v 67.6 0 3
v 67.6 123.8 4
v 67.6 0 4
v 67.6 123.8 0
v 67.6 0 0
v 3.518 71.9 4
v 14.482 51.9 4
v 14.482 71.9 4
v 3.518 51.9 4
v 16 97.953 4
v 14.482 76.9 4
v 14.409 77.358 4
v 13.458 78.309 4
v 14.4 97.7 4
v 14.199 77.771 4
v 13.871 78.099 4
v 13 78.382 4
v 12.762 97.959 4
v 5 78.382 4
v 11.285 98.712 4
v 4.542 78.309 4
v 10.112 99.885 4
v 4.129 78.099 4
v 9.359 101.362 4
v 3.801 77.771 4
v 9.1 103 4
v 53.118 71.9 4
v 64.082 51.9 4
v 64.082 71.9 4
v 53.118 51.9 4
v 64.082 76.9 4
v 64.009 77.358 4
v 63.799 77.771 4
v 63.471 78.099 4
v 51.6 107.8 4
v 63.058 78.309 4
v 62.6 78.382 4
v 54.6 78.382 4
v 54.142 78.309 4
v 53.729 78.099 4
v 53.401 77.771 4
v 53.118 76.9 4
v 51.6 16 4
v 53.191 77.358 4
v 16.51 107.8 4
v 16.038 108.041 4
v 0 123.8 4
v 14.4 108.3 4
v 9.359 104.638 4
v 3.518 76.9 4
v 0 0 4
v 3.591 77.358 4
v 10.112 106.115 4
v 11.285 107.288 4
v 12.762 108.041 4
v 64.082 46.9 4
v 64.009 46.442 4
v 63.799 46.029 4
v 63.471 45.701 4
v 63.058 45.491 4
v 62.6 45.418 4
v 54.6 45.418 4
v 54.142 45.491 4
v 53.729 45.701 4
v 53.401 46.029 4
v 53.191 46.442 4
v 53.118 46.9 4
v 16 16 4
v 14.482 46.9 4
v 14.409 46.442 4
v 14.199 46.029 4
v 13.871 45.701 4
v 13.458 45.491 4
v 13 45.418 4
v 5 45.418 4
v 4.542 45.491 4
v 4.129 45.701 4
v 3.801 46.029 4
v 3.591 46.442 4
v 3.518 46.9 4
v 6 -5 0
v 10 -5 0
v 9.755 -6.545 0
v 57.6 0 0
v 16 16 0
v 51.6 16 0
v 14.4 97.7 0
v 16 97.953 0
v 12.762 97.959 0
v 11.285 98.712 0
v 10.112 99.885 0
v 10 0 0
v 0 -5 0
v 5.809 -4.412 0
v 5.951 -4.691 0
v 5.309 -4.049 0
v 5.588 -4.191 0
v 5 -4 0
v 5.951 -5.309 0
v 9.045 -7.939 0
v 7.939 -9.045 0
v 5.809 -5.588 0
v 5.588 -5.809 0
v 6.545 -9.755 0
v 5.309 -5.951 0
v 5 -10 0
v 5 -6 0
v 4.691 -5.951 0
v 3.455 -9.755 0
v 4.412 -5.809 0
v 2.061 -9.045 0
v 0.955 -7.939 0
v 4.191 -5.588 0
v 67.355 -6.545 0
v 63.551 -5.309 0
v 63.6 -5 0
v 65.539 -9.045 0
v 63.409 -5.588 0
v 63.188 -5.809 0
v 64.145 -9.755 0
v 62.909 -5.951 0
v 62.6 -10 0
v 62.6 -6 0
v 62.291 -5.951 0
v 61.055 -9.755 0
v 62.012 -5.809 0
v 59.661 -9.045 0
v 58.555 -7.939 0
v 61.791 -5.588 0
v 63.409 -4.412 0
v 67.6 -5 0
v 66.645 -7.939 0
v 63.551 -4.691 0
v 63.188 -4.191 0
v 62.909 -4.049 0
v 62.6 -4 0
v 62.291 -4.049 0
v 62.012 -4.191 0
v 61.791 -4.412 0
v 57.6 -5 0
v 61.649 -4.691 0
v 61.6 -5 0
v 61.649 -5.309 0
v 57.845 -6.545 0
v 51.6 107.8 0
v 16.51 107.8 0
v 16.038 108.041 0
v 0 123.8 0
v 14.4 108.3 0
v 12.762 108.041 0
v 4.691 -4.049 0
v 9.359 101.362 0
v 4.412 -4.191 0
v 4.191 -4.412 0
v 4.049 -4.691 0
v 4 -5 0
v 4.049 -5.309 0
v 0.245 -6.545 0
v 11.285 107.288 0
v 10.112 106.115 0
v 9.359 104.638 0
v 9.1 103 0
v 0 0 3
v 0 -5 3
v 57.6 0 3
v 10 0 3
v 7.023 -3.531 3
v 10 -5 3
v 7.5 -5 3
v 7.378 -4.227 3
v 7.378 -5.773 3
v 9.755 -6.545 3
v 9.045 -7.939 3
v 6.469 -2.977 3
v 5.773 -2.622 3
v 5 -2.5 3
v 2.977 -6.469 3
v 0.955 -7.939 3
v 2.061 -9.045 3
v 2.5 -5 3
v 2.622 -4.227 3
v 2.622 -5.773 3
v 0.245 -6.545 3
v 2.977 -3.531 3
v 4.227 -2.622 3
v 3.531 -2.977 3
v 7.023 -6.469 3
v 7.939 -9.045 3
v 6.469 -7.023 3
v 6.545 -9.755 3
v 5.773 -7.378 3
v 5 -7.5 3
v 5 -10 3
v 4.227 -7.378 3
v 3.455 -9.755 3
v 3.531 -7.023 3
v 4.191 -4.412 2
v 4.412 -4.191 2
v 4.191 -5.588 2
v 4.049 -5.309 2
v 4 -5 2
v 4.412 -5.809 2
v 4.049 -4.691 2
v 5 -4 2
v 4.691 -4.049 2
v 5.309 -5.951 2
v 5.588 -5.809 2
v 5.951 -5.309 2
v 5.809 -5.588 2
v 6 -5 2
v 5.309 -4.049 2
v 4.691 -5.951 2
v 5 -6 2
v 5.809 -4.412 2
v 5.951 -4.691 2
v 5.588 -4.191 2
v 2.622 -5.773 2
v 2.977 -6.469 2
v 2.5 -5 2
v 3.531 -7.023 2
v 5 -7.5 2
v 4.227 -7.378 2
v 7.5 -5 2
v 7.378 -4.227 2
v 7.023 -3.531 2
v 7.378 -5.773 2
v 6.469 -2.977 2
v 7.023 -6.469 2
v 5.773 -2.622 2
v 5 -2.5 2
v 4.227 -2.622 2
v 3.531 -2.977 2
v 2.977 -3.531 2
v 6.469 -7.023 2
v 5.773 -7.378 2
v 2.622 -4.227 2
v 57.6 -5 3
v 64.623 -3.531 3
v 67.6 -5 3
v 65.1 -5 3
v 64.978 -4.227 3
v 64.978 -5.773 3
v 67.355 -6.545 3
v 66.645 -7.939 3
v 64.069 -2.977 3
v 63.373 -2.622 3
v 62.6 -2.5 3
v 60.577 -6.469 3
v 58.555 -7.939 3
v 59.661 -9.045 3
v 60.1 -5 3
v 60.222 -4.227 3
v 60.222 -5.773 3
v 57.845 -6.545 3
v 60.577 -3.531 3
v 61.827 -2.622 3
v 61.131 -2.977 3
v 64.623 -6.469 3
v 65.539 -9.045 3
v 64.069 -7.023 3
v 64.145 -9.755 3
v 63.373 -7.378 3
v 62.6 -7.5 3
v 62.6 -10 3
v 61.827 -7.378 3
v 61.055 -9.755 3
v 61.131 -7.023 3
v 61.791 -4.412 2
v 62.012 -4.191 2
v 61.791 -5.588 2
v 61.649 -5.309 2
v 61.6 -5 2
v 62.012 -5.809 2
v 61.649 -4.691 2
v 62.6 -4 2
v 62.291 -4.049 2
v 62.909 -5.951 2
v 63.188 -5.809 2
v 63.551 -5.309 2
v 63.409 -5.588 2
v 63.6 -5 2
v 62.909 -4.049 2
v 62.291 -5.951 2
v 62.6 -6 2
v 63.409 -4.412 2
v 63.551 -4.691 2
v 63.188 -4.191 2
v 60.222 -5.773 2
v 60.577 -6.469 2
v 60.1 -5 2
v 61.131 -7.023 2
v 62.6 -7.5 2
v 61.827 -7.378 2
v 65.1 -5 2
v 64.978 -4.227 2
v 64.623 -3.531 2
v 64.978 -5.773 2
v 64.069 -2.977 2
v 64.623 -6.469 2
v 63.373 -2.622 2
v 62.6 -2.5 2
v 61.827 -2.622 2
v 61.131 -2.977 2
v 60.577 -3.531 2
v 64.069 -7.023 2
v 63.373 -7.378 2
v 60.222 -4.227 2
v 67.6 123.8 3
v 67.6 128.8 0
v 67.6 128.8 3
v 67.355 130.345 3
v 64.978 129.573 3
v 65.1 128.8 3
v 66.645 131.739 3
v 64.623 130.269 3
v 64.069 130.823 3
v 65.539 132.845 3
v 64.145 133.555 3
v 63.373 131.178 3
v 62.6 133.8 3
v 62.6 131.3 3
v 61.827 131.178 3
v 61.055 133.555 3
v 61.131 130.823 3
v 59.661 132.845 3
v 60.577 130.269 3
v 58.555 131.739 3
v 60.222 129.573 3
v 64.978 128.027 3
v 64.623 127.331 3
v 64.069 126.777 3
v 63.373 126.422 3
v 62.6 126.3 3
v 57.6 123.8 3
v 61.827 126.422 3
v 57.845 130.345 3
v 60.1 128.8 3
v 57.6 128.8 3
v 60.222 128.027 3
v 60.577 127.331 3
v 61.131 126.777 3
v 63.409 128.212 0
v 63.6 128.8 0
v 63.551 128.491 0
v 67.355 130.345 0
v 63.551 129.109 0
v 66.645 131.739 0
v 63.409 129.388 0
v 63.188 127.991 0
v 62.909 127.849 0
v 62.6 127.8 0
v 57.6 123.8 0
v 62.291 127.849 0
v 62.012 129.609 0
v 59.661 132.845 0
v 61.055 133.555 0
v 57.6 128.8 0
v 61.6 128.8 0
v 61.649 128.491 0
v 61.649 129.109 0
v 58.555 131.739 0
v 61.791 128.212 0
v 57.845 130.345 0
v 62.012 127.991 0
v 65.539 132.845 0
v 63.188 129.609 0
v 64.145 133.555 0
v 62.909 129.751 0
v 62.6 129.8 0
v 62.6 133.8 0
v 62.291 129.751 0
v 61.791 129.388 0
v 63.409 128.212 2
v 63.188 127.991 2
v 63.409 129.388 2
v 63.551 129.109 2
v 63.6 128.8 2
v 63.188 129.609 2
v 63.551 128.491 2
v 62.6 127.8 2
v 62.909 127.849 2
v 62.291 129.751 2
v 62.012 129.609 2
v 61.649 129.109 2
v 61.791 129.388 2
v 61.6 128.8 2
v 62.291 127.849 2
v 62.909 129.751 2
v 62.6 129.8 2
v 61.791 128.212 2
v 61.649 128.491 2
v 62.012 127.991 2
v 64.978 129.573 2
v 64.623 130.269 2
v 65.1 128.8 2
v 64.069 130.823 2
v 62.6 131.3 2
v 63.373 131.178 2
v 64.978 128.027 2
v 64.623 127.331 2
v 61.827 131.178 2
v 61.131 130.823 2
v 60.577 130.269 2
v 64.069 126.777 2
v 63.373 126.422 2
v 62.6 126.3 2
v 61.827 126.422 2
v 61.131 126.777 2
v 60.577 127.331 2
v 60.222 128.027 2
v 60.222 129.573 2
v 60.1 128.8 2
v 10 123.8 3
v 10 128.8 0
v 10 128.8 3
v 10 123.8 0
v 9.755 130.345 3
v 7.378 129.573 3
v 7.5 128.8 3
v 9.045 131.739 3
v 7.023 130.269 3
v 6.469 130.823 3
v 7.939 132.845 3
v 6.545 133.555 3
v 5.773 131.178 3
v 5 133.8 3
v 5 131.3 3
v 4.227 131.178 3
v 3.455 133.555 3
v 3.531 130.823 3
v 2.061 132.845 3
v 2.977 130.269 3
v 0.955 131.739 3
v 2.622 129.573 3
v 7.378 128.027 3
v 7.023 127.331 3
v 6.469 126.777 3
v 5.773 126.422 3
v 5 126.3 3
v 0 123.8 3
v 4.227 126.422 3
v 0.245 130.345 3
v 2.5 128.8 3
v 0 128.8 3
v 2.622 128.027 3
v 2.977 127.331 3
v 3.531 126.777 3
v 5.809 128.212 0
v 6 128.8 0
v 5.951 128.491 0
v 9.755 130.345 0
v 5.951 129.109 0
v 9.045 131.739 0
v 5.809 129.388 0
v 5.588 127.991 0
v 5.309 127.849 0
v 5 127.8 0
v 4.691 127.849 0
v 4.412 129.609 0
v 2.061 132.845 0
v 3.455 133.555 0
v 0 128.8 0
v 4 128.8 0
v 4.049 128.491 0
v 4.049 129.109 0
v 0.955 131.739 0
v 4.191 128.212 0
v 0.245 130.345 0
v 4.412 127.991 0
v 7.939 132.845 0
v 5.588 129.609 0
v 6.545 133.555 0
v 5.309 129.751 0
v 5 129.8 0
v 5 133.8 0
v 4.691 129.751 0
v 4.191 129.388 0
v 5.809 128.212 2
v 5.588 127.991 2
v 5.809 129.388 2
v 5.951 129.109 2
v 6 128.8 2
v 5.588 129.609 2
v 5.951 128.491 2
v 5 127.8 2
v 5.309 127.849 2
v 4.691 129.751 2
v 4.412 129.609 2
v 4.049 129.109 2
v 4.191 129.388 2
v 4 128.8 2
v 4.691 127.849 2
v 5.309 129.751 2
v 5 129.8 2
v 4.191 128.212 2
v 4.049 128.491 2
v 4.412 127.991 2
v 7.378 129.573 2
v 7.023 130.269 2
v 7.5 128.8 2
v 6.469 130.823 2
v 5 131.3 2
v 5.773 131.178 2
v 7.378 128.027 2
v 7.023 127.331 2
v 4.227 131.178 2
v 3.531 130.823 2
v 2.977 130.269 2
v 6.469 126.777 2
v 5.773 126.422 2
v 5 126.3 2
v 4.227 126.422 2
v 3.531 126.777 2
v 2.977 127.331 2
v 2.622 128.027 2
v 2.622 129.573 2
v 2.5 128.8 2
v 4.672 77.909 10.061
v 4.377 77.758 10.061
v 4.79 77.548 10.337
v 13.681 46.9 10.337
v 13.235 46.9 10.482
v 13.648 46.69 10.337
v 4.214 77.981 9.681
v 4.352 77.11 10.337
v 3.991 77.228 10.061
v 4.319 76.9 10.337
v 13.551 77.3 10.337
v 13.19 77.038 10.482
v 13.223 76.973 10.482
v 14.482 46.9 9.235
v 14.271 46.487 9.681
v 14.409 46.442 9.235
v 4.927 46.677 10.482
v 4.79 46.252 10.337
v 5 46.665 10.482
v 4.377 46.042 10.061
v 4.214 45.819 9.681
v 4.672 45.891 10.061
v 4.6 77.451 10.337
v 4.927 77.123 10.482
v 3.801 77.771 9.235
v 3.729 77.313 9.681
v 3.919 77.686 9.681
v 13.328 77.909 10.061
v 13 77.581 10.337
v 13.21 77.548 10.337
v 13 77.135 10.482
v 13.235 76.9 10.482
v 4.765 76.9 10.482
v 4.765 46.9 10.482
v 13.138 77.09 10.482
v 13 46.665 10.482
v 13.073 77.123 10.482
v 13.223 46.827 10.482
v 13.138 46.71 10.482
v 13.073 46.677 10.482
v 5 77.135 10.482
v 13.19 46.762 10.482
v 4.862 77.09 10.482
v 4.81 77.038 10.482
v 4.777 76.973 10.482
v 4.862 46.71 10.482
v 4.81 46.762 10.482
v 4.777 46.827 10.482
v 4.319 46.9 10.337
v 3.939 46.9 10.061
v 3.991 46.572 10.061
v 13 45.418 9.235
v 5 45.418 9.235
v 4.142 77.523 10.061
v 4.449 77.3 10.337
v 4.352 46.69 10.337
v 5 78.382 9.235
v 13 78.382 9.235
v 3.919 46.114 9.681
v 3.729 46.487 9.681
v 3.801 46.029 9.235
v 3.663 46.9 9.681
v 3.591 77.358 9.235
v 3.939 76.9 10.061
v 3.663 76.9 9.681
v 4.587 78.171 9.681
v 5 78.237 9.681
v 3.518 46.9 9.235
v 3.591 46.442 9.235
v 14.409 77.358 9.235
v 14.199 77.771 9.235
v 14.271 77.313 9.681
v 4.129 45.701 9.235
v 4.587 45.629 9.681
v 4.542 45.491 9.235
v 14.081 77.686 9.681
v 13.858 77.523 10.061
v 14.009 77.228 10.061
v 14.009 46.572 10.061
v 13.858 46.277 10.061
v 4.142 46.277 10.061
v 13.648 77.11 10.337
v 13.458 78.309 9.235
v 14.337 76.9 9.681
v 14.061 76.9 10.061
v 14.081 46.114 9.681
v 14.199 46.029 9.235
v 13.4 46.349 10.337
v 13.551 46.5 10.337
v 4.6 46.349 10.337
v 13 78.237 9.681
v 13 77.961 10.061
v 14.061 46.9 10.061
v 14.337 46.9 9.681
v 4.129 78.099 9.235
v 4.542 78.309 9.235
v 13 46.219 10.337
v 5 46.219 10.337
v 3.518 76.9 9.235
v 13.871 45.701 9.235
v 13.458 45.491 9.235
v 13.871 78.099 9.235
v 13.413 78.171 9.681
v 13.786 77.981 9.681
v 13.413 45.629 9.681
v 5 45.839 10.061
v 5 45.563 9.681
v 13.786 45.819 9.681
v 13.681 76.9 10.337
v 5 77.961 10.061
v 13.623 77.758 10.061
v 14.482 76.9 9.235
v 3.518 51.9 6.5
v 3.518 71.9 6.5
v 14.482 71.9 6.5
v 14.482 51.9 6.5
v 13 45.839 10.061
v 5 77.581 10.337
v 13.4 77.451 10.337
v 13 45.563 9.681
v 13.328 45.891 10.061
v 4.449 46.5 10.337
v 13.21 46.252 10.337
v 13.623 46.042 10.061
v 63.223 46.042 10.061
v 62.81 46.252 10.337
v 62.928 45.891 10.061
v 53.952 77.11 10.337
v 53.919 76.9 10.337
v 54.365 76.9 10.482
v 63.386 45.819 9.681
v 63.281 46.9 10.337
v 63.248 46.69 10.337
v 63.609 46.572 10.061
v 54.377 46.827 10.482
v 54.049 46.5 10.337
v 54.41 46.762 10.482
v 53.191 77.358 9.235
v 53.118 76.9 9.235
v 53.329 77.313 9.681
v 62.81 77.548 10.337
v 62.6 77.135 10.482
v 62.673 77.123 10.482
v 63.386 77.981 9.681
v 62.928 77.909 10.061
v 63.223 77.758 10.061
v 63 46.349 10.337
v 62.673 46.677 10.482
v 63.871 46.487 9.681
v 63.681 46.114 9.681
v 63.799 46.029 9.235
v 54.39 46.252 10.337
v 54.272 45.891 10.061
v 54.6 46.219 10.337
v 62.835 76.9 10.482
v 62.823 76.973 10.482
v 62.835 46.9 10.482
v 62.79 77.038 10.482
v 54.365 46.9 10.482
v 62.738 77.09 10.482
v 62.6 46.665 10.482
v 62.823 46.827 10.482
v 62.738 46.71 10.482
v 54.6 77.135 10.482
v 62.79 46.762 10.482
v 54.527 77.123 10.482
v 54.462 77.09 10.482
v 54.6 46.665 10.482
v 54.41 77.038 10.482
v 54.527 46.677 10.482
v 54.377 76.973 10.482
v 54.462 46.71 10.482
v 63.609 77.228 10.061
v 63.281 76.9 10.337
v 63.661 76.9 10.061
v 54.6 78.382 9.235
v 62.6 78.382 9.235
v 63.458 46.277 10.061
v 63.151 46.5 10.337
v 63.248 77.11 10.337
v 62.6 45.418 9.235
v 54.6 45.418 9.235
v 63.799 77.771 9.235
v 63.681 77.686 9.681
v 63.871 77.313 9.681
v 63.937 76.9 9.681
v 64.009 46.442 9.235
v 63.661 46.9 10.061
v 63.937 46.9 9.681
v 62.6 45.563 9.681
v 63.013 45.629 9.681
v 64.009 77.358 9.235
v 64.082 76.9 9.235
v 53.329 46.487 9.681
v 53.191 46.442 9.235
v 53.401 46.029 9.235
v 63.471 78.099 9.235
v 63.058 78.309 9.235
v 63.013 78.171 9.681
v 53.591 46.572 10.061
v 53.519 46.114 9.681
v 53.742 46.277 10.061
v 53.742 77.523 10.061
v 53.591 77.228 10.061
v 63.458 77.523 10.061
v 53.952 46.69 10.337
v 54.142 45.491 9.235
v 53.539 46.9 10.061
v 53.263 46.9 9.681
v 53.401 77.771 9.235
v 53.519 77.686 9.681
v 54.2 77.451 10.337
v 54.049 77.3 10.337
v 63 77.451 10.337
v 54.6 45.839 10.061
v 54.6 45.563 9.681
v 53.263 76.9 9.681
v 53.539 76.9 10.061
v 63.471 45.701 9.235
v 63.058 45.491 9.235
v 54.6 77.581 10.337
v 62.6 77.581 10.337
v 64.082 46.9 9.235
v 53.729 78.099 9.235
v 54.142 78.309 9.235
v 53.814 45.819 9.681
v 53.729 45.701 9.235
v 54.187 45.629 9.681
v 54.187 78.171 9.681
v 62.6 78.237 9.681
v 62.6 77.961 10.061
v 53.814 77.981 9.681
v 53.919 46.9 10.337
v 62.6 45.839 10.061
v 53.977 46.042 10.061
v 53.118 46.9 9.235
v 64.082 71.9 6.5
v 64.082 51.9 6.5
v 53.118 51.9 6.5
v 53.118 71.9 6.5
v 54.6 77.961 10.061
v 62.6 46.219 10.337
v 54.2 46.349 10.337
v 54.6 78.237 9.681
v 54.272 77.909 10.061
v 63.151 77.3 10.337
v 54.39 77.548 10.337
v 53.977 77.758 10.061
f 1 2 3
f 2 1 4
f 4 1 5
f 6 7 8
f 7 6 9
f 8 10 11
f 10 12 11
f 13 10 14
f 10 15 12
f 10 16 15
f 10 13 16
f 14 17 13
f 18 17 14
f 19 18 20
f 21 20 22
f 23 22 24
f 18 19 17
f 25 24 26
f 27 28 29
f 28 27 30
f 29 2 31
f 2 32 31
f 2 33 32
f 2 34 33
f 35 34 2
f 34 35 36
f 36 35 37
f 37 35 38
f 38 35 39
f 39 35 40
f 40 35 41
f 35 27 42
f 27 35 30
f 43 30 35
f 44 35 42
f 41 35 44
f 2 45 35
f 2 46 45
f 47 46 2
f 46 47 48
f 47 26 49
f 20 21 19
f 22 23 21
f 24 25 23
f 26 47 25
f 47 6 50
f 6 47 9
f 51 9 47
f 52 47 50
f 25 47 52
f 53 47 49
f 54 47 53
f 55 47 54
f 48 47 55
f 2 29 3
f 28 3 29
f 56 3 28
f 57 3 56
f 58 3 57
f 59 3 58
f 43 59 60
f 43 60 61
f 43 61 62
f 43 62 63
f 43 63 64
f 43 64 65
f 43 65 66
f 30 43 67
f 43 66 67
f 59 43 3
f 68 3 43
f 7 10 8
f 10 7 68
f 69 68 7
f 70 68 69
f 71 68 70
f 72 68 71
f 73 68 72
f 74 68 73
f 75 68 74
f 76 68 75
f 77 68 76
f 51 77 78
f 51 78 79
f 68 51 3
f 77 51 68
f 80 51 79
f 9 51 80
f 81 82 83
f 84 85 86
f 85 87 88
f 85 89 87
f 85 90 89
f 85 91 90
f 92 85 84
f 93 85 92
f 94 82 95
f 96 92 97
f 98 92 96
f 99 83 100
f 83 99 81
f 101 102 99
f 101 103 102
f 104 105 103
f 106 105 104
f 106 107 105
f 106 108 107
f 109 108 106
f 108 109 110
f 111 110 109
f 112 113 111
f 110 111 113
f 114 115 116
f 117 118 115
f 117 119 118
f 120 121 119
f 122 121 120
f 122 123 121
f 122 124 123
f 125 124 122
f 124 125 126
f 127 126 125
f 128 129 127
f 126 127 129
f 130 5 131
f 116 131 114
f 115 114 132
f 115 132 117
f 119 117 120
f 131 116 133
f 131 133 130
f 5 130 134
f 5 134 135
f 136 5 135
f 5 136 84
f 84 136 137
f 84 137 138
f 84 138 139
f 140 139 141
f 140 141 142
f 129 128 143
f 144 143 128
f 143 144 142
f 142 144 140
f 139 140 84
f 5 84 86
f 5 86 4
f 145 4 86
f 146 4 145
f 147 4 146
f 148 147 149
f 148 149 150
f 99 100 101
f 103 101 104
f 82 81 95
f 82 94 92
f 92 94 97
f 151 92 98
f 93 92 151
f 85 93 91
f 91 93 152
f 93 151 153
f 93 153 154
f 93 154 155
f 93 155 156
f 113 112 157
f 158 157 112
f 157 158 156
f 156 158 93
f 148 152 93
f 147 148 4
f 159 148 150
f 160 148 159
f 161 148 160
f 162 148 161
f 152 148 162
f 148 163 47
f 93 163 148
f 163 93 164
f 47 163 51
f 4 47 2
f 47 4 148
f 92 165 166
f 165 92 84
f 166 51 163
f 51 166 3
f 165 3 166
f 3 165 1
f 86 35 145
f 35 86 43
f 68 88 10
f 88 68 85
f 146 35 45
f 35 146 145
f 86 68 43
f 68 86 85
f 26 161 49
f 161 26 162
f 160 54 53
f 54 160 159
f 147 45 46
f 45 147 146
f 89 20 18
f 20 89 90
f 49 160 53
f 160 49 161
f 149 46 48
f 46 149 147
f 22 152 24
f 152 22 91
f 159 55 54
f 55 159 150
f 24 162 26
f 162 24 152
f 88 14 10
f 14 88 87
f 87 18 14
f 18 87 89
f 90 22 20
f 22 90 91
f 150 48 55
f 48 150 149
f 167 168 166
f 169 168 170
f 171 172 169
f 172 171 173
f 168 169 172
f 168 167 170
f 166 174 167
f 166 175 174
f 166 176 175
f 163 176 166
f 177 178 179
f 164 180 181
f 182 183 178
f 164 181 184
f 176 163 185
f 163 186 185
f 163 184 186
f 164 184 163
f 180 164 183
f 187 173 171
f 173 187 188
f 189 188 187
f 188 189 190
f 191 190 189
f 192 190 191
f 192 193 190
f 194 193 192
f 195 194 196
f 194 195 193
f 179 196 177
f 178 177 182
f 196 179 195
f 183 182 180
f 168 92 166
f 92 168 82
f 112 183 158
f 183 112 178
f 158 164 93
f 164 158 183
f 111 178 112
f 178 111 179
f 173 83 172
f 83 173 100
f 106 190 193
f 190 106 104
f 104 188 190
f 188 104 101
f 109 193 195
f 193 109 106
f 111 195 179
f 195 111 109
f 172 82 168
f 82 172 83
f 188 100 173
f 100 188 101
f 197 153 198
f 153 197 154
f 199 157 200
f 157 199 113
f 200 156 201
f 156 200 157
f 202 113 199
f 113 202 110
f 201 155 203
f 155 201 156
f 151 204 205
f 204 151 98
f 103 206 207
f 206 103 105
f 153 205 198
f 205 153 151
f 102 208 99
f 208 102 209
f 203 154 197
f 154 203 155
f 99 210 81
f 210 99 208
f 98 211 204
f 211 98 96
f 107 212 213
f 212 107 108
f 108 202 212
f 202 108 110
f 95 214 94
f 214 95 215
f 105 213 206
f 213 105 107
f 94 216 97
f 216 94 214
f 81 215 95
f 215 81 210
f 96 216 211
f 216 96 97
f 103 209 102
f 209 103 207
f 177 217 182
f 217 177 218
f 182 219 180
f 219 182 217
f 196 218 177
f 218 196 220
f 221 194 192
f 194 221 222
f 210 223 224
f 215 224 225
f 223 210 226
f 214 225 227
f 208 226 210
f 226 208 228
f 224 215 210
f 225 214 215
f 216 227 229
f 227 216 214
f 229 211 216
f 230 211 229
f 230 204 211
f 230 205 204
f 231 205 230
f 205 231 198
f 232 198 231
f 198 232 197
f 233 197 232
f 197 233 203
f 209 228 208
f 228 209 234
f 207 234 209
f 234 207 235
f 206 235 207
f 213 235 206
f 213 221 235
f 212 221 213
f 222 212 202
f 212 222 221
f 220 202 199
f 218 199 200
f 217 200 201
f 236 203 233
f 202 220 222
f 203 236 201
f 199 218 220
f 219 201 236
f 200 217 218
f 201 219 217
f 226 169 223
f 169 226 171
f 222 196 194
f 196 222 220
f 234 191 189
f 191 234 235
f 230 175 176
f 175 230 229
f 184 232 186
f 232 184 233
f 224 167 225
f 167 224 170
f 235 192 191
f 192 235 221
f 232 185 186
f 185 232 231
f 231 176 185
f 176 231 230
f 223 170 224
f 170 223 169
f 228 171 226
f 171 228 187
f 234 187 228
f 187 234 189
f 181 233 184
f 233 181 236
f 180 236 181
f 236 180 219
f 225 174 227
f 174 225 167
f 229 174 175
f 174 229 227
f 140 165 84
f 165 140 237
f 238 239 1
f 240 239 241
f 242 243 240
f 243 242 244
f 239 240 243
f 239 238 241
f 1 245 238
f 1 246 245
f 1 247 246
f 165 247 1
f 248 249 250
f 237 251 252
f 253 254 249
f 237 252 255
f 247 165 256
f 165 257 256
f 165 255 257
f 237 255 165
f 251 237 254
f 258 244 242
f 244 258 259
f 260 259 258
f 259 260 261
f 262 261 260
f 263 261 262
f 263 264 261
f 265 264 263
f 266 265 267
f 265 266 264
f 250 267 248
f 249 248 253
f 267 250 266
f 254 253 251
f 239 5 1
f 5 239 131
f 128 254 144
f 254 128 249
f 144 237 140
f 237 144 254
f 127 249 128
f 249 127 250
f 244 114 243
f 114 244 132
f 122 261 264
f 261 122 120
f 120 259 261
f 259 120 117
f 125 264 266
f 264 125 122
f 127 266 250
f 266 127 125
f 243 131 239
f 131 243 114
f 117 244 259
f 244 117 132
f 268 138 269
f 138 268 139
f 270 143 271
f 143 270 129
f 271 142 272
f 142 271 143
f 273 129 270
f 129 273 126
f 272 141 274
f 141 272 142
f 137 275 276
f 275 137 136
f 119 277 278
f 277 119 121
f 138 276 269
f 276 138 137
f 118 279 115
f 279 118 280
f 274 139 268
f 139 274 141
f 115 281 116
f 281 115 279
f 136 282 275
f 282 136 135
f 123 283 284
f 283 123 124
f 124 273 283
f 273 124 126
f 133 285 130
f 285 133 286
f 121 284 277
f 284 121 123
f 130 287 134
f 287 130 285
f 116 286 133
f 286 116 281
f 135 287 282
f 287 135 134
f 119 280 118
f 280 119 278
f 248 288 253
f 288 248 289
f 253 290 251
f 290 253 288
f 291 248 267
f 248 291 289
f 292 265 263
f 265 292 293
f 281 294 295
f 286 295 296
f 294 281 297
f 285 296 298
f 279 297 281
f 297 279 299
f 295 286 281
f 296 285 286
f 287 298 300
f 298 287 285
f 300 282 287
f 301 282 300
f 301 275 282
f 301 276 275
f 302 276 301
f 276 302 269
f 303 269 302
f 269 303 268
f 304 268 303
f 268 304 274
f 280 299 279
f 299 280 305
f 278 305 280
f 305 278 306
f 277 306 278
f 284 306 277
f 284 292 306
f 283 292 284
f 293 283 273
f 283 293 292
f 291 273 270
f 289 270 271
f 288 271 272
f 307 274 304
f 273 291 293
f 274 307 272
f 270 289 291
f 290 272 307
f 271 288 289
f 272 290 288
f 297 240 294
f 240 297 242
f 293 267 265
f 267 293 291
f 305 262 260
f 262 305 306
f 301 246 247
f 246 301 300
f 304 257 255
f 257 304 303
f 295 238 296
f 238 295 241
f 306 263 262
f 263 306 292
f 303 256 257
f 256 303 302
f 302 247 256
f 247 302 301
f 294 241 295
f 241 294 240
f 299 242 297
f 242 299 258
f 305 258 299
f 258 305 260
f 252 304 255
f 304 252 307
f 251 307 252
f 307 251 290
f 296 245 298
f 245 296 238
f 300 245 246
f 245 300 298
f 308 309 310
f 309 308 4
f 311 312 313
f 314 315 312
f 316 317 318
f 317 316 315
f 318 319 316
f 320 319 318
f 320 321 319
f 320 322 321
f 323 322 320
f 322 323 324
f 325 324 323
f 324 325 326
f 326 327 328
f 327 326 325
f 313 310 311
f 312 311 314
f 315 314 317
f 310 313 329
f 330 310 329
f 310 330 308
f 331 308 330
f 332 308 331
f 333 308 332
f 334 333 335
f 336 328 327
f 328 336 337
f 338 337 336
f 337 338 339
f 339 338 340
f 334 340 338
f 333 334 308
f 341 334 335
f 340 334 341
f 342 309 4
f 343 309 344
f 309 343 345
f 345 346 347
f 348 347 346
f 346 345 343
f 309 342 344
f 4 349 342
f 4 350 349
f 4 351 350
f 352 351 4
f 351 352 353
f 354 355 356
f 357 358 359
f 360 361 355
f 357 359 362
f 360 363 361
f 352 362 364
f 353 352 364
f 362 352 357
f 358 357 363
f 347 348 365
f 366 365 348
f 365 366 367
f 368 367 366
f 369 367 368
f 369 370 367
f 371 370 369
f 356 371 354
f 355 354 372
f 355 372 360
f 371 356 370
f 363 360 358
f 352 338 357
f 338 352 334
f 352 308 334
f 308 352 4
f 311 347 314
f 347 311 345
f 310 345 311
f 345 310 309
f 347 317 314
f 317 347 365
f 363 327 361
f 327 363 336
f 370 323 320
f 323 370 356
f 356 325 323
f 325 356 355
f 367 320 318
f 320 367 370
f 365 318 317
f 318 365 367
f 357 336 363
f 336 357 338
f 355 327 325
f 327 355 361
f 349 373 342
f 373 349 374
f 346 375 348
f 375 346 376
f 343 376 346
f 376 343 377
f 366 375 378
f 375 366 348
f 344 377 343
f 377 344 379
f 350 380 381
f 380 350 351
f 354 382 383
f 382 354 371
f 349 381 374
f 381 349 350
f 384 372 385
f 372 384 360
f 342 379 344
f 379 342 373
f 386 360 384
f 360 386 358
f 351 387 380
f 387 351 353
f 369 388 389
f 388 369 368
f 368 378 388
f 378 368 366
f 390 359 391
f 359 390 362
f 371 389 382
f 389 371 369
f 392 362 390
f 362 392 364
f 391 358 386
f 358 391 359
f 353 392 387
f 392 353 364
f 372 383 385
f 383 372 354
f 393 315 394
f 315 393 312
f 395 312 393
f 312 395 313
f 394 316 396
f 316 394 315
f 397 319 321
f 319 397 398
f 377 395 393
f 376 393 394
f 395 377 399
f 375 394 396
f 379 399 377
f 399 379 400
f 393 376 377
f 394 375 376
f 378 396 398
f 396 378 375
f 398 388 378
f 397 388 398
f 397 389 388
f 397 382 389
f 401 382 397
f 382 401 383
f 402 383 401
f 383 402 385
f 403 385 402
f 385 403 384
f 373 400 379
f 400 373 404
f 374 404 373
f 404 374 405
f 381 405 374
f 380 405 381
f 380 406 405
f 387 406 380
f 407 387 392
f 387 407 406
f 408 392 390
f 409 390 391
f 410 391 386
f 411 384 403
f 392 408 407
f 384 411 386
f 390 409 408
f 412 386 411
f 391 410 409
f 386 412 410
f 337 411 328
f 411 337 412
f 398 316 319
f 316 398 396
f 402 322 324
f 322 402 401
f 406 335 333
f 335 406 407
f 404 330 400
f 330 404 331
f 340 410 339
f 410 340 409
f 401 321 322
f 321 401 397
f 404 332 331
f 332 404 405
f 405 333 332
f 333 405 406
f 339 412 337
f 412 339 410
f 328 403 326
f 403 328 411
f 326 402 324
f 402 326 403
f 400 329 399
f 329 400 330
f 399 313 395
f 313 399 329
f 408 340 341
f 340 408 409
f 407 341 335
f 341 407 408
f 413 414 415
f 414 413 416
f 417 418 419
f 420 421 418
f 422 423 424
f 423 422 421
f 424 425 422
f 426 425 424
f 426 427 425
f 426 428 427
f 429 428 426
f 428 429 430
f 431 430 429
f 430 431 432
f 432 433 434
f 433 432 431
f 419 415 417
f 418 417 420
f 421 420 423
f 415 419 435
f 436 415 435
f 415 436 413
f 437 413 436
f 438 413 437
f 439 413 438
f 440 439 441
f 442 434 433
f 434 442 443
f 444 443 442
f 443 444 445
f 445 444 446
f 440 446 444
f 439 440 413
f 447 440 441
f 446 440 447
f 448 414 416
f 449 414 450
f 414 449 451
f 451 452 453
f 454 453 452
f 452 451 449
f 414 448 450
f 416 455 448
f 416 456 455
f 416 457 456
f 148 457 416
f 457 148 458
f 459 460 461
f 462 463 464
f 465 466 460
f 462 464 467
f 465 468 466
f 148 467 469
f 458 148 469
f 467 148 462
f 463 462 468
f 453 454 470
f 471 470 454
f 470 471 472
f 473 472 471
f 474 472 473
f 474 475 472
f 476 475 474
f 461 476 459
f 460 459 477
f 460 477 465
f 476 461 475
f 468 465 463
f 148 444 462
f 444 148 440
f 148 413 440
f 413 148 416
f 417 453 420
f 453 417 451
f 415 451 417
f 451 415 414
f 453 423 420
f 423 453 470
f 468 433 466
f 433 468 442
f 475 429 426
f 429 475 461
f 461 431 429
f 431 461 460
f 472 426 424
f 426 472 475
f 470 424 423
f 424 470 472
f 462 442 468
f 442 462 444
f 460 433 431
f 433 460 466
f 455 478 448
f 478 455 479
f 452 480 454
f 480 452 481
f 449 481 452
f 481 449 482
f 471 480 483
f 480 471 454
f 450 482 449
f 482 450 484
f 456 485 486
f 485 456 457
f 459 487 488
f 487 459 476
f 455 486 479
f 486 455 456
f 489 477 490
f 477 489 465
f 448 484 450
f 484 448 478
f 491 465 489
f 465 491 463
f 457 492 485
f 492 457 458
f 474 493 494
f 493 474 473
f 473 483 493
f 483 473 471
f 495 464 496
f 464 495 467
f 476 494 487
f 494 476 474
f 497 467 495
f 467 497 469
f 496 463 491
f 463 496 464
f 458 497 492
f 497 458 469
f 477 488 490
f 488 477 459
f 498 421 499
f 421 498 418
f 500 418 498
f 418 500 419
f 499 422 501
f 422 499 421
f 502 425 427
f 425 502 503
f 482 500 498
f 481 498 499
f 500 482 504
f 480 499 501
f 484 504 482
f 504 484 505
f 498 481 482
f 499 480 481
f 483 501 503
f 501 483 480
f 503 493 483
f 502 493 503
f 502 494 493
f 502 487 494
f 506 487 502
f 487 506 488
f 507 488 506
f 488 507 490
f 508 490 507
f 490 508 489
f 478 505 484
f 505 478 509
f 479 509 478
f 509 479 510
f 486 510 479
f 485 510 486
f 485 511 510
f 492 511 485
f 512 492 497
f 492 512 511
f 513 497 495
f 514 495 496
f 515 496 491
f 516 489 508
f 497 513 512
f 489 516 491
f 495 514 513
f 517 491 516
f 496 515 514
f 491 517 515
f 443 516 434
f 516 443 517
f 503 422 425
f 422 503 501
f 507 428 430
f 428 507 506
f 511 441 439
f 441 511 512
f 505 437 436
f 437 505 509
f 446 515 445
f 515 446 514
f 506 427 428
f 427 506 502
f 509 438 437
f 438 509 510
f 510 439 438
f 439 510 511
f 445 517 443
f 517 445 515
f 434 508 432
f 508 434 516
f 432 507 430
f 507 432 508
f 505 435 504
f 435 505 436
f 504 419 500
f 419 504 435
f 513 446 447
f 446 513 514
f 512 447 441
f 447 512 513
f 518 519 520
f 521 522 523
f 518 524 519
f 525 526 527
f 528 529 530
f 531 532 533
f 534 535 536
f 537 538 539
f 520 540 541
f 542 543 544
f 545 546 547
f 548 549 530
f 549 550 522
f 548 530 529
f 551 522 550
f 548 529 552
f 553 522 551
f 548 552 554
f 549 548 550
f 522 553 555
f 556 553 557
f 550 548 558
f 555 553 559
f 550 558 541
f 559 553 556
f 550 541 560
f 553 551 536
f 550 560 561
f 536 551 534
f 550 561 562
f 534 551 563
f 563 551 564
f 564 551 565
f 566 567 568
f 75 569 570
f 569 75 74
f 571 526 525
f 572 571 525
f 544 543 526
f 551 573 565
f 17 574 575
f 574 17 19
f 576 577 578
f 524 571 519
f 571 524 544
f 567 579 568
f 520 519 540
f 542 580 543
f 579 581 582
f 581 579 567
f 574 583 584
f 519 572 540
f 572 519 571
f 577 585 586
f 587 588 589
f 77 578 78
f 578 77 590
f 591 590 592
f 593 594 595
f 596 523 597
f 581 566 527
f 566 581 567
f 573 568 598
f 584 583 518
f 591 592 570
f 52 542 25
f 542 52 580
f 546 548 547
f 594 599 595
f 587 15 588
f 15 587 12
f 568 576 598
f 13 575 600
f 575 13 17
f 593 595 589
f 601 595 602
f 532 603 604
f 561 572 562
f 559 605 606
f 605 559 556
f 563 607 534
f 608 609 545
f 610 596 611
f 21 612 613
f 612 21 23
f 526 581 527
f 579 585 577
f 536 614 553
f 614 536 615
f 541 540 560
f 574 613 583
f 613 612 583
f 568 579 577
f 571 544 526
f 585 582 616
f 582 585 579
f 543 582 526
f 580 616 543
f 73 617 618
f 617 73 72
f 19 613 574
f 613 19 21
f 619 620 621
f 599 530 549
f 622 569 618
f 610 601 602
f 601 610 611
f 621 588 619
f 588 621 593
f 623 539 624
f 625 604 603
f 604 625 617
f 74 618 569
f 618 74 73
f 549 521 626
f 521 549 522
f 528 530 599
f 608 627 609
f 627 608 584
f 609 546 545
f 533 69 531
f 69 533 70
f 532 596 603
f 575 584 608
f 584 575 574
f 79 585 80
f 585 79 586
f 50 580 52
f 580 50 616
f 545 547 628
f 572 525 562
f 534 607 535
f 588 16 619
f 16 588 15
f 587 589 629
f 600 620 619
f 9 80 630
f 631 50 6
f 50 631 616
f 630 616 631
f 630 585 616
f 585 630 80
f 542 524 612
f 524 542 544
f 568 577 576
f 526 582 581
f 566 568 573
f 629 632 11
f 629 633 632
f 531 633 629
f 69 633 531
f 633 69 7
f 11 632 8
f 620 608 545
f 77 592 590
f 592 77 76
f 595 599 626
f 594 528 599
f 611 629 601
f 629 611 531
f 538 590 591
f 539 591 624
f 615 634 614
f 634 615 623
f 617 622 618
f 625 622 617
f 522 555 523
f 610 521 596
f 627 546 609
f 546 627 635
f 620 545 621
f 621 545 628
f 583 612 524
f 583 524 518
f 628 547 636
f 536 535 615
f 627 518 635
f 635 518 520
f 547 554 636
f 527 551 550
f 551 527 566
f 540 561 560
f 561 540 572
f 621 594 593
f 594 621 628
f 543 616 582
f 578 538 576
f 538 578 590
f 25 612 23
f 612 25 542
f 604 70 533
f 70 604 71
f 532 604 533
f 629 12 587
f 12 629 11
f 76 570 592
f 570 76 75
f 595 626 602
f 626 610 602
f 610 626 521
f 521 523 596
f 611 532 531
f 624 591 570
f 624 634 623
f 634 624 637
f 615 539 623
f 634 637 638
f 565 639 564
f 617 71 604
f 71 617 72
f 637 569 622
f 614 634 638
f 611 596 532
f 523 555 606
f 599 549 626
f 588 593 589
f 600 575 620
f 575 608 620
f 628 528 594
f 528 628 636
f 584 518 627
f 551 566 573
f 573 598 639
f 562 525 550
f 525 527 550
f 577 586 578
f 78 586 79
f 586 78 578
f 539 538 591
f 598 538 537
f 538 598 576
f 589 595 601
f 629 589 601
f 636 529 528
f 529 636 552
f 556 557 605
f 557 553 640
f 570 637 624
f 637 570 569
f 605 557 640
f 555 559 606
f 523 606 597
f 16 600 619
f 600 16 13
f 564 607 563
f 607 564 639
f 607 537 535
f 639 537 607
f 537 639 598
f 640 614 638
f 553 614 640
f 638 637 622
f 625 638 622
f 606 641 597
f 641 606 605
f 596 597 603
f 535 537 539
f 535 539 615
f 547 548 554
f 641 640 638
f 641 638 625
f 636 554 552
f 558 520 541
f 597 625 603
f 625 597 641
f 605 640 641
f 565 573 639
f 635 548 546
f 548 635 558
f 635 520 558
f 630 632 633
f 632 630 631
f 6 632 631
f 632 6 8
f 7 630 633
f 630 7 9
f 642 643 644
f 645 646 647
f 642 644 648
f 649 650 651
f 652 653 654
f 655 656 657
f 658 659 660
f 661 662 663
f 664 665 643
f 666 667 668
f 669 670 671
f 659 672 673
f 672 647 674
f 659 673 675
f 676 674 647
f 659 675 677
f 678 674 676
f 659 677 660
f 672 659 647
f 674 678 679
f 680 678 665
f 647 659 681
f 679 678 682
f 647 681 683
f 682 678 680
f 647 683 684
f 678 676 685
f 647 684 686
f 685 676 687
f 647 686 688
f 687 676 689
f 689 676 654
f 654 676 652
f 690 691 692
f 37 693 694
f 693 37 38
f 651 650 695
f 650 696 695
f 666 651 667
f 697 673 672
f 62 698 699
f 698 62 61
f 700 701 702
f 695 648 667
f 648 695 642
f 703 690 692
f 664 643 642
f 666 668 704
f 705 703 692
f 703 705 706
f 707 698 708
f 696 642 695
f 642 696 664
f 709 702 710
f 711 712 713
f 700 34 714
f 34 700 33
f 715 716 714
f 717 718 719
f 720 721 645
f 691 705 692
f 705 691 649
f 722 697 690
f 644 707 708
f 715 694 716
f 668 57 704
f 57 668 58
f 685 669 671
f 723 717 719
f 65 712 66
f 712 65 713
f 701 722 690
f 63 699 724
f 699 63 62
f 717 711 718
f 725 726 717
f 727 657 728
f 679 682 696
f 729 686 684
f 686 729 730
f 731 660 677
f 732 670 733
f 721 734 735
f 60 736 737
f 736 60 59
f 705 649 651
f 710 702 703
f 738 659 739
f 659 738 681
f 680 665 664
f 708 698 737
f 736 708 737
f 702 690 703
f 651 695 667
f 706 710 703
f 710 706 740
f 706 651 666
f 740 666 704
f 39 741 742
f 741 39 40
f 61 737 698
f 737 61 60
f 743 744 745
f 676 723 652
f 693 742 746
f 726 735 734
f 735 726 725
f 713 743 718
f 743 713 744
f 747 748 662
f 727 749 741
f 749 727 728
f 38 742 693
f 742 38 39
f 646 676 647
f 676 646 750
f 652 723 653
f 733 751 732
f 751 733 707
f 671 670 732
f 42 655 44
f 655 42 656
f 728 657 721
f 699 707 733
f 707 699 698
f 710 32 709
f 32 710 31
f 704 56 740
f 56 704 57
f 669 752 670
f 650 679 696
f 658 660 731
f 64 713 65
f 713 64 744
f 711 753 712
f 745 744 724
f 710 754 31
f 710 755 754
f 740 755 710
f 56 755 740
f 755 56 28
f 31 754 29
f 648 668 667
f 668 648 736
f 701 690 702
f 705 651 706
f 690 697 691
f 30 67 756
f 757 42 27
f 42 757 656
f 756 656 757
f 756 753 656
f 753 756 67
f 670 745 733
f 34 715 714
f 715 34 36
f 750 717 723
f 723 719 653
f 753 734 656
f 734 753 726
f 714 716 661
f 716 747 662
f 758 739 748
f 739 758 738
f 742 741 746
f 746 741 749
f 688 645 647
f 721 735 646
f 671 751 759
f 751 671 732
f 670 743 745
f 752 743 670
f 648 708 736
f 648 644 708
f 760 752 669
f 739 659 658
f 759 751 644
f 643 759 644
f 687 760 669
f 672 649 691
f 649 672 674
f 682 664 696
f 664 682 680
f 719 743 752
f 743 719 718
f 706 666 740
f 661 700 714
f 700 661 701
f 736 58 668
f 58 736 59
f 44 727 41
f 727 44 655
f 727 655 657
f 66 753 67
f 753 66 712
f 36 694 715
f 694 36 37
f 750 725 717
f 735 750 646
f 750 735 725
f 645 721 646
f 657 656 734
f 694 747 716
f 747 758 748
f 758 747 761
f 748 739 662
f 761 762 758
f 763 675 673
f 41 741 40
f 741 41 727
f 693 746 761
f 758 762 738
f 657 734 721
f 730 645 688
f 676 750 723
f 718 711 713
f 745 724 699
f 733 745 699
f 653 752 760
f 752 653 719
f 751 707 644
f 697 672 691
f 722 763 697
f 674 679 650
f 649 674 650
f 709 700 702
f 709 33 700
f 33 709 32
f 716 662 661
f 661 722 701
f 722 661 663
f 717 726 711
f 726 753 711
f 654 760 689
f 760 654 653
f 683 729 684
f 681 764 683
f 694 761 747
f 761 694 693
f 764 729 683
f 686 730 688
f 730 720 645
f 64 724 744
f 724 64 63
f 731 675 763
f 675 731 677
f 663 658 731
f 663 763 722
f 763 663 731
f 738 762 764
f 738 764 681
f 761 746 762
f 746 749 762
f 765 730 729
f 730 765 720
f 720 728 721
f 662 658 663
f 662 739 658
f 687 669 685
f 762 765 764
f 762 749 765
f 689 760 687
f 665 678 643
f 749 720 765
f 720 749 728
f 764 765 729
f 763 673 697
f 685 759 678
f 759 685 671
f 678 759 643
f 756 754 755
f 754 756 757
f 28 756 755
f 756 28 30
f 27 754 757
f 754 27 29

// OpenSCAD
// file: params.scad
$fn = 20;

very_long = 500;
short_length = 1;

// phone
phone_width = 59.6;
phone_height = 115.8;
phone_bottom_thickness = 9.0;
phone_total_thickness = 14.5;
phone_top_thickness = phone_total_thickness - phone_bottom_thickness;
phone_speaker_width = 19.7;
phone_speaker_to_edge = 9.0;
phone_screen_bottom_to_edge = 7.1;
phone_screen_top_to_edge = 13.9;
phone_left_top_to_edge = 5.6;
phone_right_top_to_edge = 6.6;
phone_screen_length = phone_height - phone_screen_bottom_to_edge;
phone_usb_to_top = 31.5;
phone_usb_to_back = 2;
phone_usb_width = 12.8;
phone_usb_height = phone_bottom_thickness - phone_usb_to_back;
phone_mic_radius = 5;
phone_power_to_right = 3.5;
phone_power_width = 20.5;
phone_volume_button_to_bottom = 4;
phone_volume_button_to_edge = 12.2;
phone_volume_button_width = 20.6;
phone_camera_button_to_bottom = phone_volume_button_to_bottom;
phone_camera_button_to_edge = 17;
phone_camera_button_width = 13;
phone_camera_center_to_left = 10.4;
phone_camera_center_to_top = 16.8;
phone_camera_radius = 5.3;

// connector
connector_thickness = 3.0;
connector_radius = 5.0;

// shield
shield_common_thickness = 4.0;
shield_bottom_inner_edge = 12;

// screw
screw_diameter = 2.0;
screw_depth = 2.0;
screw_cap_diameter = 5.0;

// belt
belt_connector_width = 8;
belt_connector_length = 30;
belt_connector_thickness = 5;
belt_hole_length = 20;
belt_hole_thickness = 2.5;
belt_connector_from_edge = 5;
belt_round_radius = 1.5;
// file: common.scad
include <params.scad>;

module connector(){
	difference(){
		union(){
			translate([-connector_radius, 0, 0]){
				cube([connector_radius * 2, connector_radius, connector_thickness]);
			};
			translate([0, connector_radius, 0]){
				cylinder(connector_thickness, connector_radius, connector_radius);
			}
		};
		translate([0, connector_radius, 0])union(){
			cylinder(connector_thickness, screw_diameter / 2, screw_diameter / 2);
			translate([0, 0, screw_depth]){
				cylinder(connector_thickness - screw_depth, screw_cap_diameter / 2, screw_cap_diameter / 2);
			}
		};
	}
}

module connector2(width){
	for(t = [
		[connector_radius, 0, 0],
		[width - connector_radius, 0, 0]
	]){
		translate(t)
			rotate([0, 0, 180])
				connector();
	}
}

module connector4(width, height){
	connector2(width);
	translate([width, height, 0])
		rotate([0, 0, 180])
			connector2(width);
}

module put_rotated_2(){
	for(i = [0:$children-1])
		child(i);
	rotate([0, 0, 180])
		for(i = [0:$children-1])
			child(i);
}

module drop(width, height, depth){
	translate([width / 2, height / 2, 0])
		rotate([180, 180, 180])
			cube([width, height, depth]);
}
// main file
include <common.scad>;
echo(phone_height);
bottom_part_width = phone_width + shield_common_thickness * 2;
bottom_part_height = phone_height + shield_common_thickness * 2;
true_inner_edge = shield_common_thickness + shield_bottom_inner_edge;

difference(){
	cube([
		bottom_part_width,
		bottom_part_height,
		shield_common_thickness
	]);
	translate([true_inner_edge, true_inner_edge, 0])
		cube([
			bottom_part_width - true_inner_edge * 2, 
			bottom_part_height - true_inner_edge * 2, 
			shield_common_thickness
		]);
	translate([shield_common_thickness + phone_camera_center_to_left, shield_common_thickness + phone_height - phone_camera_center_to_top, 0])
		cylinder(shield_common_thickness, phone_camera_radius, phone_camera_radius);
}
connector4(bottom_part_width, bottom_part_height);

module belt_connector(){
	difference(){
		translate([-belt_connector_width / 2, -belt_connector_length / 2, 0])
			minkowski(){
				cube([belt_connector_width, belt_connector_length, belt_connector_thickness]);
				sphere(belt_round_radius);
			}
		translate([-belt_connector_width, -belt_hole_length / 2, 0])
			cube([belt_connector_width * 2, belt_hole_length, belt_hole_thickness]);
	}
}

translate([bottom_part_width / 2, bottom_part_height / 2, shield_common_thickness])
	put_rotated_2()
		translate([-phone_width / 2 - shield_common_thickness + belt_connector_from_edge + belt_connector_width / 2, 0, 0])
			belt_connector();
